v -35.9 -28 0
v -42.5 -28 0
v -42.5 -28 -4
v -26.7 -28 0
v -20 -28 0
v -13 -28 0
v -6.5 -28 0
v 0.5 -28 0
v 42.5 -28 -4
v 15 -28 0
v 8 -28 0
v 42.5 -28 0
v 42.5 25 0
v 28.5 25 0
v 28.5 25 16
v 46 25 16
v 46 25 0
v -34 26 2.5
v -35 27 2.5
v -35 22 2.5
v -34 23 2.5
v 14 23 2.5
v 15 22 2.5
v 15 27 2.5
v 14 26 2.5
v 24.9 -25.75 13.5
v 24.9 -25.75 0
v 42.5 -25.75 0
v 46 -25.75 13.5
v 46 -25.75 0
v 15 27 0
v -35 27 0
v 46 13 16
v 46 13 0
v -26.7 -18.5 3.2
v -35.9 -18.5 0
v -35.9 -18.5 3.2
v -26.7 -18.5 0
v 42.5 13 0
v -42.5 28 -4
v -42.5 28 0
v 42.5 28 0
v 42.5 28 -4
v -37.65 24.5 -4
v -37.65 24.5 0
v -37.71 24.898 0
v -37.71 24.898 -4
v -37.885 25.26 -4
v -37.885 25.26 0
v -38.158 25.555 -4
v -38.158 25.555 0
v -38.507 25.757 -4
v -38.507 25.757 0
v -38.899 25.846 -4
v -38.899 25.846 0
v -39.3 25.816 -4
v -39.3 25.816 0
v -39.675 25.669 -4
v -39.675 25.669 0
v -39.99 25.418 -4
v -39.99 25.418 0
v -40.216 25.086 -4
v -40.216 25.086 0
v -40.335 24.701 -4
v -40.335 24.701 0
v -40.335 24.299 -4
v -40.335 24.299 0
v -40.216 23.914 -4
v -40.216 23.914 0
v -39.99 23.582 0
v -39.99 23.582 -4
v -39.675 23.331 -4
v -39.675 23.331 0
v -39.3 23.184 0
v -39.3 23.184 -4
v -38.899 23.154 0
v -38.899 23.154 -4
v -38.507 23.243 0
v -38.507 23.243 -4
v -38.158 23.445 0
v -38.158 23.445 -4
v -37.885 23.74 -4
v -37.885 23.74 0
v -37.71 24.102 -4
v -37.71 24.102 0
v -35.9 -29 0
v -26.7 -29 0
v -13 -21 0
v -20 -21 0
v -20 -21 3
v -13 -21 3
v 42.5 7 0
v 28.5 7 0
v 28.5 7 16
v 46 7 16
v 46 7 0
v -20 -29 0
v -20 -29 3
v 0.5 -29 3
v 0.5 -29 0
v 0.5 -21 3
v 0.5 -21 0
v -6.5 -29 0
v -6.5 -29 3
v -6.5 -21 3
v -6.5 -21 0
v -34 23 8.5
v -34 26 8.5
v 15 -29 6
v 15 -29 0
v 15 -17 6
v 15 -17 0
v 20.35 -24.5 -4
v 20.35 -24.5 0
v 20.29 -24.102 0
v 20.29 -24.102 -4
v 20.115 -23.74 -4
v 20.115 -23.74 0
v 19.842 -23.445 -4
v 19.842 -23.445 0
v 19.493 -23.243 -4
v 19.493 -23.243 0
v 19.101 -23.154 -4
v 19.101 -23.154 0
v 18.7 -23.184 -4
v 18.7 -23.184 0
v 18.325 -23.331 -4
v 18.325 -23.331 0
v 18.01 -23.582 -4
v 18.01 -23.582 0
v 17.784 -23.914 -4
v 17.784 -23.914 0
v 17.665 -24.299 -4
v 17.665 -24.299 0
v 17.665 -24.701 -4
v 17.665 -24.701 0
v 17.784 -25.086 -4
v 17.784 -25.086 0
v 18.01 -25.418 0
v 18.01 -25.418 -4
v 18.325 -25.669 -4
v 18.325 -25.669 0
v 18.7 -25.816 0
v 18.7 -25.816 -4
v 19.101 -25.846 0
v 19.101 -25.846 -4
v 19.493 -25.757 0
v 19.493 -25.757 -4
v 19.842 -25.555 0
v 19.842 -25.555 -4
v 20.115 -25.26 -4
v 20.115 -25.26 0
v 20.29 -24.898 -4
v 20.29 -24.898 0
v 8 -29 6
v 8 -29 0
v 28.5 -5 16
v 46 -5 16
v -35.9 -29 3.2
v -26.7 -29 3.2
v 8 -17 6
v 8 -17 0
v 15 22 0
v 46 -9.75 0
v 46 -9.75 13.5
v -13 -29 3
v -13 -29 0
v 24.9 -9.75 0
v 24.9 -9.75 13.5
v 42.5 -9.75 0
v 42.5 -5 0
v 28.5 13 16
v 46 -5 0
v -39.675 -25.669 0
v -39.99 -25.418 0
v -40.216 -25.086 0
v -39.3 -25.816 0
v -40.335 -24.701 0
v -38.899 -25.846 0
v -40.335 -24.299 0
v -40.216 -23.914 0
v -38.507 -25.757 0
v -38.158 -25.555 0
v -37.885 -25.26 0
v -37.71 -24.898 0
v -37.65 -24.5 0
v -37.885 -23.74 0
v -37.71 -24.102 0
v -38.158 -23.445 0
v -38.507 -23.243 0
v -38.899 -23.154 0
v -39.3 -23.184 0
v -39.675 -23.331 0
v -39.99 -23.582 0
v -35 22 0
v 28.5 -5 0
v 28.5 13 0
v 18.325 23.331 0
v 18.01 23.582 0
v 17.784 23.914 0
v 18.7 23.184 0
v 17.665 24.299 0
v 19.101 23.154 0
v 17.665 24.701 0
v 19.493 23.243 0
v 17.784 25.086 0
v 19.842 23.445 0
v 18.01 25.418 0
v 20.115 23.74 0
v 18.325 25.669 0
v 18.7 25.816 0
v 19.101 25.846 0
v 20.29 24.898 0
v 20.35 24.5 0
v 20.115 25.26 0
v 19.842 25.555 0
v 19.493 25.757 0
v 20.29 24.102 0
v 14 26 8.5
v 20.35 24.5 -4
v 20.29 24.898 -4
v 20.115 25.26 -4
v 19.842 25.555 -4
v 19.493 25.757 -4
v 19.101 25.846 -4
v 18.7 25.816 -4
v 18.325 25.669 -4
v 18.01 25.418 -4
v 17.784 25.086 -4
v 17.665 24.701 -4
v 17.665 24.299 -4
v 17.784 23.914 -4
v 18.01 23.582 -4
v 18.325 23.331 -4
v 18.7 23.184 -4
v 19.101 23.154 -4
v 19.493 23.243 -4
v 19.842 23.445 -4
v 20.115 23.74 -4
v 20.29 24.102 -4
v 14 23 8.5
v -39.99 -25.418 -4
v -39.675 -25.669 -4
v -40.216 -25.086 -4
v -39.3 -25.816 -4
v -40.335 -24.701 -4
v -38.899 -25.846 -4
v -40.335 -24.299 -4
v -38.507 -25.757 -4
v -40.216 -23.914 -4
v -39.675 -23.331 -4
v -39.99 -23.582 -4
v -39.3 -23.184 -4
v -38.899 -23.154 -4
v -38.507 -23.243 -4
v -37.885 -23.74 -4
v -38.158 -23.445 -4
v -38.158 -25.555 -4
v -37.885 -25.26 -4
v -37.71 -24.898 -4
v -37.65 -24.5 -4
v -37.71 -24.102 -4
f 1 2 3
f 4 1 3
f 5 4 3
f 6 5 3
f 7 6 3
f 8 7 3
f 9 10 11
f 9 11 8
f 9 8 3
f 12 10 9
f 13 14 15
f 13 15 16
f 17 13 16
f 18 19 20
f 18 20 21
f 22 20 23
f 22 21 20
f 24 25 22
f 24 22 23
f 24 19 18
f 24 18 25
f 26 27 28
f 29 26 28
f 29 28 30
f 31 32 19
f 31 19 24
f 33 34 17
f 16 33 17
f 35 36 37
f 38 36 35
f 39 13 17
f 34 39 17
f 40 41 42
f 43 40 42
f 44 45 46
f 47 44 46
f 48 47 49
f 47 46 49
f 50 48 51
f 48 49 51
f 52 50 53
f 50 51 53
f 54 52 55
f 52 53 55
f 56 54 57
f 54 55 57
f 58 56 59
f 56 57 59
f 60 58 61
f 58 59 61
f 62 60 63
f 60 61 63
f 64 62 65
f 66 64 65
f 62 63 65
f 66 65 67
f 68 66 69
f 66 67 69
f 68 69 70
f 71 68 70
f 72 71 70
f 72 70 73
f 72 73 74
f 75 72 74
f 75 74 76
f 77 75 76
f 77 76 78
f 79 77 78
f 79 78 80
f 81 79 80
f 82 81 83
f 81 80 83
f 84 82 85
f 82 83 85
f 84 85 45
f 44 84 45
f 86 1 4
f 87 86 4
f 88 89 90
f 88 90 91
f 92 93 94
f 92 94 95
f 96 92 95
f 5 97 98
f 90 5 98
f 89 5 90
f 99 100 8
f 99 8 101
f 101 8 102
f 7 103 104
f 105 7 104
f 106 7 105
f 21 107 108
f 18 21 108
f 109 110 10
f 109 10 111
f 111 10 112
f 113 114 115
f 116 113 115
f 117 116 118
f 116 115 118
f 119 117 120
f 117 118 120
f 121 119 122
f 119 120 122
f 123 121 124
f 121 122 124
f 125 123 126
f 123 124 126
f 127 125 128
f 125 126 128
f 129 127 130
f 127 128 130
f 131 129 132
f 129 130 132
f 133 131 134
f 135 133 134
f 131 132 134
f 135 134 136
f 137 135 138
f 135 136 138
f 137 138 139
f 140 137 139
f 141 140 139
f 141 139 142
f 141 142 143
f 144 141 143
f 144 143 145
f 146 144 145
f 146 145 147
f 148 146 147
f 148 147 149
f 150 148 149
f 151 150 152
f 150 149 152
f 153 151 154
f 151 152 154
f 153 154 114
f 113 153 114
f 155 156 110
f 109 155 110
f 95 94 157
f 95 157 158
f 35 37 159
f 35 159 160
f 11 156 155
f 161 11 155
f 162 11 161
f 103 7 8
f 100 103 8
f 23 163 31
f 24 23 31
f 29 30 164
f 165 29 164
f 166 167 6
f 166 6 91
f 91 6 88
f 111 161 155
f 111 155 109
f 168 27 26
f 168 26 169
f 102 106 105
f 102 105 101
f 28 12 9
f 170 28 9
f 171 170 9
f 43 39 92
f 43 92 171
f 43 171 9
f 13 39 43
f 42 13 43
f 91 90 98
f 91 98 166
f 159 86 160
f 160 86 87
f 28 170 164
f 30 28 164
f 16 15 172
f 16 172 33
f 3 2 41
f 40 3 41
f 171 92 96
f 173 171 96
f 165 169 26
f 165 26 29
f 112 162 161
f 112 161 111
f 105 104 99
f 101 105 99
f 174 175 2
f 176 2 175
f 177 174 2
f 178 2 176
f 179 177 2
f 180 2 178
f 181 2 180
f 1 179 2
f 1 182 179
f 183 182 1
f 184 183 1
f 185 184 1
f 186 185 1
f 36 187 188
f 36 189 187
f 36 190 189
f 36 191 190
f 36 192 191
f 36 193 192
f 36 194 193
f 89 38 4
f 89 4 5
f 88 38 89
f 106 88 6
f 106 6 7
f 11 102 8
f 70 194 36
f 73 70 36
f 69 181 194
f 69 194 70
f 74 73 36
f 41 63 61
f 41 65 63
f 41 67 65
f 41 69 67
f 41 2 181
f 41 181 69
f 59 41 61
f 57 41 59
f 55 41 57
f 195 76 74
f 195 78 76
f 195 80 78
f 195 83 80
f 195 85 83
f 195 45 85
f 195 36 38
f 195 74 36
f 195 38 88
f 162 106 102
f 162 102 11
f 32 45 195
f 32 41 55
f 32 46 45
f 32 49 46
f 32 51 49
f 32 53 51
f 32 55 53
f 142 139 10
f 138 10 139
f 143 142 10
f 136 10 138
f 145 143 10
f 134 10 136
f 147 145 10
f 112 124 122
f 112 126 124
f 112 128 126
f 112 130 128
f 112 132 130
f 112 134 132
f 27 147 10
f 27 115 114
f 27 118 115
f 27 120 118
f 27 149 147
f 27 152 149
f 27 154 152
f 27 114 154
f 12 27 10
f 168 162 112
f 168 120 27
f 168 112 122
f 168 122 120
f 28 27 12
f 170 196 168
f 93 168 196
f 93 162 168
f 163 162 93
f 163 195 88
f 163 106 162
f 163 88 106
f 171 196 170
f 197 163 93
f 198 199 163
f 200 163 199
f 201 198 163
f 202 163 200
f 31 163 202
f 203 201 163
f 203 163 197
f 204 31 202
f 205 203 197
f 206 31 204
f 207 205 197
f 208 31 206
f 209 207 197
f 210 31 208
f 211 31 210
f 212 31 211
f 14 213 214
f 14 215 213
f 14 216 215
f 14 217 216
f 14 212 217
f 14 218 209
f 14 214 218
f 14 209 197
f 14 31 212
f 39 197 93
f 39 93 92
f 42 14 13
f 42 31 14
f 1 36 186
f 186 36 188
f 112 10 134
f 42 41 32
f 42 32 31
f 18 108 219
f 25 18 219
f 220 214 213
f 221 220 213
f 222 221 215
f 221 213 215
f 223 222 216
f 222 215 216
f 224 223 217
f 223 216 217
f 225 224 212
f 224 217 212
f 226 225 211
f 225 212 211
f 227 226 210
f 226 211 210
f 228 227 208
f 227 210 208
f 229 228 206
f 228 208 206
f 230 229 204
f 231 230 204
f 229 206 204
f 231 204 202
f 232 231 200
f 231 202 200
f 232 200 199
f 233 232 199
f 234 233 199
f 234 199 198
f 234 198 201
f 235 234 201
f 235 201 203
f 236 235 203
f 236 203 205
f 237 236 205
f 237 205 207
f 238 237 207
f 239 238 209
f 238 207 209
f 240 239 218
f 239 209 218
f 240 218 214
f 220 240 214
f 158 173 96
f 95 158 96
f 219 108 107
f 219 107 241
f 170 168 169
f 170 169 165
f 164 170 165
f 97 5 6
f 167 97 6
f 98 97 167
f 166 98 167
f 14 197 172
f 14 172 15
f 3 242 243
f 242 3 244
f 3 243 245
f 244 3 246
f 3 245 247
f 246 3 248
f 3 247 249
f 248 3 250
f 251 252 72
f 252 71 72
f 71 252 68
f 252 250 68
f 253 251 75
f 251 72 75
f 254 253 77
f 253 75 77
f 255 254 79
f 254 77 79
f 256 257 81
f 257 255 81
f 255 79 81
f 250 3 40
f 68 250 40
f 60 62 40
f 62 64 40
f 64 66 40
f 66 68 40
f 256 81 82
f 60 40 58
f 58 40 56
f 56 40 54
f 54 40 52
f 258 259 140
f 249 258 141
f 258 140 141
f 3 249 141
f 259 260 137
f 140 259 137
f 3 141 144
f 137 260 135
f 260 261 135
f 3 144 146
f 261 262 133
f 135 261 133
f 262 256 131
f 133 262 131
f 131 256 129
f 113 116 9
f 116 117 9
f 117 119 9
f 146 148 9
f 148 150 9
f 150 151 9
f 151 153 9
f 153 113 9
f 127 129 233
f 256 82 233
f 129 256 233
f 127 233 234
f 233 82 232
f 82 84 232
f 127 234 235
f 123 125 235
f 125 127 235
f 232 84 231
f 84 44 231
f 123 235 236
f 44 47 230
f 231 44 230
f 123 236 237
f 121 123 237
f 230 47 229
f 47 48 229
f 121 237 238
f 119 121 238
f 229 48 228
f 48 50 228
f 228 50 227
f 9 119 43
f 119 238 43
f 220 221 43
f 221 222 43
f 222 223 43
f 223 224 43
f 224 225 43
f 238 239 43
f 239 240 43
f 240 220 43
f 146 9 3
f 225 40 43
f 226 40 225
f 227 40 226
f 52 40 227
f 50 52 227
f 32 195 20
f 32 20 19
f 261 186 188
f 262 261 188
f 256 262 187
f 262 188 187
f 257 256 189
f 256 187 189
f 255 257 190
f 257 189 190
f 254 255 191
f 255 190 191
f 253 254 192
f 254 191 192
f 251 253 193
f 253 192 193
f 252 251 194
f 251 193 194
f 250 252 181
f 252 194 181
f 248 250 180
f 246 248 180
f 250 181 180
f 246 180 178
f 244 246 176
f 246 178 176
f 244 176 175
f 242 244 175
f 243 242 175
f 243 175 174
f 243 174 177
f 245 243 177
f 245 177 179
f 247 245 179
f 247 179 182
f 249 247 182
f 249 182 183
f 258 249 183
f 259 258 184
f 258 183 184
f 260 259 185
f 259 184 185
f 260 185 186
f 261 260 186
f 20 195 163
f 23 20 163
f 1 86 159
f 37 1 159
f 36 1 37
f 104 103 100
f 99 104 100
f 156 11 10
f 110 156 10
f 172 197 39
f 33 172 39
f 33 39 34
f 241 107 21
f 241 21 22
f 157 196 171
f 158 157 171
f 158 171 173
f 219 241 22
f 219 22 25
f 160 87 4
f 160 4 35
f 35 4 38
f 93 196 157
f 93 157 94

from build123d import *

# Parameters (mm, degrees)
SKETCH_W      = 85
SKETCH_H      = 56
SKETCH_R      = 1.35
PAD_DEPTH     = 4
SKETCH001_W   = 50
SKETCH001_H   = 5
PAD001_DEPTH  = 8.5
SKETCH002_W   = 50
SKETCH002_H   = 5
SKETCH002_W_2 = 48
SKETCH002_H_2 = 3
POCKET_DEPTH  = 6
SKETCH003_W   = 17.5
SKETCH003_H   = 12
PAD002_DEPTH  = 16
SKETCH004_W   = 21.1
SKETCH004_H   = 16
PAD003_DEPTH  = 13.5
SKETCH005_W   = 9.2
SKETCH005_H   = 10.5
PAD004_DEPTH  = 3.2
SKETCH006_W   = 7
SKETCH006_H   = 8
PAD005_DEPTH  = 3
SKETCH007_W   = 7
SKETCH007_H   = 12
PAD006_DEPTH  = 6


with BuildPart() as part:
    # Sketch → Pad (new body)
    with BuildSketch(Plane.XY):
        Rectangle(SKETCH_W, SKETCH_H)
        with Locations((-39, 24.5)):
            Circle(SKETCH_R, mode=Mode.SUBTRACT)
        with Locations((19, 24.5)):
            Circle(SKETCH_R, mode=Mode.SUBTRACT)
        with Locations((-39, -24.5)):
            Circle(SKETCH_R, mode=Mode.SUBTRACT)
        with Locations((19, -24.5)):
            Circle(SKETCH_R, mode=Mode.SUBTRACT)
    extrude(amount=-PAD_DEPTH)

    # Sketch001 (on Face9 of Pad) → Pad001 (join)
    with BuildSketch(Plane.XY):
        with Locations((-10, 24.5)):
            Rectangle(SKETCH001_W, SKETCH001_H)
    extrude(amount=PAD001_DEPTH)

    # Sketch002 (on Face15 of Pad001) → Pocket (cut)
    with BuildSketch(Plane.XY.offset(8.5)):
        with Locations((-10, 24.5)):
            Rectangle(SKETCH002_W, SKETCH002_H)
        with Locations((-10, 24.5)):
            Rectangle(SKETCH002_W_2, SKETCH002_H_2, mode=Mode.SUBTRACT)
    extrude(amount=-POCKET_DEPTH, mode=Mode.SUBTRACT)

    # Sketch003 (on Face4 of Pocket) → Pad002 (join)
    with BuildSketch(Plane.XY):
        with Locations((37.25, 19)):
            Rectangle(SKETCH003_W, SKETCH003_H)
        with Locations((37.25, 1)):
            Rectangle(SKETCH003_W, SKETCH003_H)
    extrude(amount=PAD002_DEPTH)

    # Sketch004 (on Face4 of Pad002) → Pad003 (join)
    with BuildSketch(Plane.XY):
        with Locations((35.45, -17.75)):
            Rectangle(SKETCH004_W, SKETCH004_H)
    extrude(amount=PAD003_DEPTH)

    # Sketch005 (on Face4 of Pad003) → Pad004 (join)
    with BuildSketch(Plane.XY):
        with Locations((-31.3, -23.75)):
            Rectangle(SKETCH005_W, SKETCH005_H)
    extrude(amount=PAD004_DEPTH)

    # Sketch006 (on Face4 of Pad004) → Pad005 (join)
    with BuildSketch(Plane.XY):
        with Locations((-16.5, -25)):
            Rectangle(SKETCH006_W, SKETCH006_H)
        with Locations((-3, -25)):
            Rectangle(SKETCH006_W, SKETCH006_H)
    extrude(amount=PAD005_DEPTH)

    # Sketch007 (on Face4 of Pad005) → Pad006 (join)
    with BuildSketch(Plane.XY):
        with Locations((11.5, -23)):
            Rectangle(SKETCH007_W, SKETCH007_H)
    extrude(amount=PAD006_DEPTH)


solid = part.part
